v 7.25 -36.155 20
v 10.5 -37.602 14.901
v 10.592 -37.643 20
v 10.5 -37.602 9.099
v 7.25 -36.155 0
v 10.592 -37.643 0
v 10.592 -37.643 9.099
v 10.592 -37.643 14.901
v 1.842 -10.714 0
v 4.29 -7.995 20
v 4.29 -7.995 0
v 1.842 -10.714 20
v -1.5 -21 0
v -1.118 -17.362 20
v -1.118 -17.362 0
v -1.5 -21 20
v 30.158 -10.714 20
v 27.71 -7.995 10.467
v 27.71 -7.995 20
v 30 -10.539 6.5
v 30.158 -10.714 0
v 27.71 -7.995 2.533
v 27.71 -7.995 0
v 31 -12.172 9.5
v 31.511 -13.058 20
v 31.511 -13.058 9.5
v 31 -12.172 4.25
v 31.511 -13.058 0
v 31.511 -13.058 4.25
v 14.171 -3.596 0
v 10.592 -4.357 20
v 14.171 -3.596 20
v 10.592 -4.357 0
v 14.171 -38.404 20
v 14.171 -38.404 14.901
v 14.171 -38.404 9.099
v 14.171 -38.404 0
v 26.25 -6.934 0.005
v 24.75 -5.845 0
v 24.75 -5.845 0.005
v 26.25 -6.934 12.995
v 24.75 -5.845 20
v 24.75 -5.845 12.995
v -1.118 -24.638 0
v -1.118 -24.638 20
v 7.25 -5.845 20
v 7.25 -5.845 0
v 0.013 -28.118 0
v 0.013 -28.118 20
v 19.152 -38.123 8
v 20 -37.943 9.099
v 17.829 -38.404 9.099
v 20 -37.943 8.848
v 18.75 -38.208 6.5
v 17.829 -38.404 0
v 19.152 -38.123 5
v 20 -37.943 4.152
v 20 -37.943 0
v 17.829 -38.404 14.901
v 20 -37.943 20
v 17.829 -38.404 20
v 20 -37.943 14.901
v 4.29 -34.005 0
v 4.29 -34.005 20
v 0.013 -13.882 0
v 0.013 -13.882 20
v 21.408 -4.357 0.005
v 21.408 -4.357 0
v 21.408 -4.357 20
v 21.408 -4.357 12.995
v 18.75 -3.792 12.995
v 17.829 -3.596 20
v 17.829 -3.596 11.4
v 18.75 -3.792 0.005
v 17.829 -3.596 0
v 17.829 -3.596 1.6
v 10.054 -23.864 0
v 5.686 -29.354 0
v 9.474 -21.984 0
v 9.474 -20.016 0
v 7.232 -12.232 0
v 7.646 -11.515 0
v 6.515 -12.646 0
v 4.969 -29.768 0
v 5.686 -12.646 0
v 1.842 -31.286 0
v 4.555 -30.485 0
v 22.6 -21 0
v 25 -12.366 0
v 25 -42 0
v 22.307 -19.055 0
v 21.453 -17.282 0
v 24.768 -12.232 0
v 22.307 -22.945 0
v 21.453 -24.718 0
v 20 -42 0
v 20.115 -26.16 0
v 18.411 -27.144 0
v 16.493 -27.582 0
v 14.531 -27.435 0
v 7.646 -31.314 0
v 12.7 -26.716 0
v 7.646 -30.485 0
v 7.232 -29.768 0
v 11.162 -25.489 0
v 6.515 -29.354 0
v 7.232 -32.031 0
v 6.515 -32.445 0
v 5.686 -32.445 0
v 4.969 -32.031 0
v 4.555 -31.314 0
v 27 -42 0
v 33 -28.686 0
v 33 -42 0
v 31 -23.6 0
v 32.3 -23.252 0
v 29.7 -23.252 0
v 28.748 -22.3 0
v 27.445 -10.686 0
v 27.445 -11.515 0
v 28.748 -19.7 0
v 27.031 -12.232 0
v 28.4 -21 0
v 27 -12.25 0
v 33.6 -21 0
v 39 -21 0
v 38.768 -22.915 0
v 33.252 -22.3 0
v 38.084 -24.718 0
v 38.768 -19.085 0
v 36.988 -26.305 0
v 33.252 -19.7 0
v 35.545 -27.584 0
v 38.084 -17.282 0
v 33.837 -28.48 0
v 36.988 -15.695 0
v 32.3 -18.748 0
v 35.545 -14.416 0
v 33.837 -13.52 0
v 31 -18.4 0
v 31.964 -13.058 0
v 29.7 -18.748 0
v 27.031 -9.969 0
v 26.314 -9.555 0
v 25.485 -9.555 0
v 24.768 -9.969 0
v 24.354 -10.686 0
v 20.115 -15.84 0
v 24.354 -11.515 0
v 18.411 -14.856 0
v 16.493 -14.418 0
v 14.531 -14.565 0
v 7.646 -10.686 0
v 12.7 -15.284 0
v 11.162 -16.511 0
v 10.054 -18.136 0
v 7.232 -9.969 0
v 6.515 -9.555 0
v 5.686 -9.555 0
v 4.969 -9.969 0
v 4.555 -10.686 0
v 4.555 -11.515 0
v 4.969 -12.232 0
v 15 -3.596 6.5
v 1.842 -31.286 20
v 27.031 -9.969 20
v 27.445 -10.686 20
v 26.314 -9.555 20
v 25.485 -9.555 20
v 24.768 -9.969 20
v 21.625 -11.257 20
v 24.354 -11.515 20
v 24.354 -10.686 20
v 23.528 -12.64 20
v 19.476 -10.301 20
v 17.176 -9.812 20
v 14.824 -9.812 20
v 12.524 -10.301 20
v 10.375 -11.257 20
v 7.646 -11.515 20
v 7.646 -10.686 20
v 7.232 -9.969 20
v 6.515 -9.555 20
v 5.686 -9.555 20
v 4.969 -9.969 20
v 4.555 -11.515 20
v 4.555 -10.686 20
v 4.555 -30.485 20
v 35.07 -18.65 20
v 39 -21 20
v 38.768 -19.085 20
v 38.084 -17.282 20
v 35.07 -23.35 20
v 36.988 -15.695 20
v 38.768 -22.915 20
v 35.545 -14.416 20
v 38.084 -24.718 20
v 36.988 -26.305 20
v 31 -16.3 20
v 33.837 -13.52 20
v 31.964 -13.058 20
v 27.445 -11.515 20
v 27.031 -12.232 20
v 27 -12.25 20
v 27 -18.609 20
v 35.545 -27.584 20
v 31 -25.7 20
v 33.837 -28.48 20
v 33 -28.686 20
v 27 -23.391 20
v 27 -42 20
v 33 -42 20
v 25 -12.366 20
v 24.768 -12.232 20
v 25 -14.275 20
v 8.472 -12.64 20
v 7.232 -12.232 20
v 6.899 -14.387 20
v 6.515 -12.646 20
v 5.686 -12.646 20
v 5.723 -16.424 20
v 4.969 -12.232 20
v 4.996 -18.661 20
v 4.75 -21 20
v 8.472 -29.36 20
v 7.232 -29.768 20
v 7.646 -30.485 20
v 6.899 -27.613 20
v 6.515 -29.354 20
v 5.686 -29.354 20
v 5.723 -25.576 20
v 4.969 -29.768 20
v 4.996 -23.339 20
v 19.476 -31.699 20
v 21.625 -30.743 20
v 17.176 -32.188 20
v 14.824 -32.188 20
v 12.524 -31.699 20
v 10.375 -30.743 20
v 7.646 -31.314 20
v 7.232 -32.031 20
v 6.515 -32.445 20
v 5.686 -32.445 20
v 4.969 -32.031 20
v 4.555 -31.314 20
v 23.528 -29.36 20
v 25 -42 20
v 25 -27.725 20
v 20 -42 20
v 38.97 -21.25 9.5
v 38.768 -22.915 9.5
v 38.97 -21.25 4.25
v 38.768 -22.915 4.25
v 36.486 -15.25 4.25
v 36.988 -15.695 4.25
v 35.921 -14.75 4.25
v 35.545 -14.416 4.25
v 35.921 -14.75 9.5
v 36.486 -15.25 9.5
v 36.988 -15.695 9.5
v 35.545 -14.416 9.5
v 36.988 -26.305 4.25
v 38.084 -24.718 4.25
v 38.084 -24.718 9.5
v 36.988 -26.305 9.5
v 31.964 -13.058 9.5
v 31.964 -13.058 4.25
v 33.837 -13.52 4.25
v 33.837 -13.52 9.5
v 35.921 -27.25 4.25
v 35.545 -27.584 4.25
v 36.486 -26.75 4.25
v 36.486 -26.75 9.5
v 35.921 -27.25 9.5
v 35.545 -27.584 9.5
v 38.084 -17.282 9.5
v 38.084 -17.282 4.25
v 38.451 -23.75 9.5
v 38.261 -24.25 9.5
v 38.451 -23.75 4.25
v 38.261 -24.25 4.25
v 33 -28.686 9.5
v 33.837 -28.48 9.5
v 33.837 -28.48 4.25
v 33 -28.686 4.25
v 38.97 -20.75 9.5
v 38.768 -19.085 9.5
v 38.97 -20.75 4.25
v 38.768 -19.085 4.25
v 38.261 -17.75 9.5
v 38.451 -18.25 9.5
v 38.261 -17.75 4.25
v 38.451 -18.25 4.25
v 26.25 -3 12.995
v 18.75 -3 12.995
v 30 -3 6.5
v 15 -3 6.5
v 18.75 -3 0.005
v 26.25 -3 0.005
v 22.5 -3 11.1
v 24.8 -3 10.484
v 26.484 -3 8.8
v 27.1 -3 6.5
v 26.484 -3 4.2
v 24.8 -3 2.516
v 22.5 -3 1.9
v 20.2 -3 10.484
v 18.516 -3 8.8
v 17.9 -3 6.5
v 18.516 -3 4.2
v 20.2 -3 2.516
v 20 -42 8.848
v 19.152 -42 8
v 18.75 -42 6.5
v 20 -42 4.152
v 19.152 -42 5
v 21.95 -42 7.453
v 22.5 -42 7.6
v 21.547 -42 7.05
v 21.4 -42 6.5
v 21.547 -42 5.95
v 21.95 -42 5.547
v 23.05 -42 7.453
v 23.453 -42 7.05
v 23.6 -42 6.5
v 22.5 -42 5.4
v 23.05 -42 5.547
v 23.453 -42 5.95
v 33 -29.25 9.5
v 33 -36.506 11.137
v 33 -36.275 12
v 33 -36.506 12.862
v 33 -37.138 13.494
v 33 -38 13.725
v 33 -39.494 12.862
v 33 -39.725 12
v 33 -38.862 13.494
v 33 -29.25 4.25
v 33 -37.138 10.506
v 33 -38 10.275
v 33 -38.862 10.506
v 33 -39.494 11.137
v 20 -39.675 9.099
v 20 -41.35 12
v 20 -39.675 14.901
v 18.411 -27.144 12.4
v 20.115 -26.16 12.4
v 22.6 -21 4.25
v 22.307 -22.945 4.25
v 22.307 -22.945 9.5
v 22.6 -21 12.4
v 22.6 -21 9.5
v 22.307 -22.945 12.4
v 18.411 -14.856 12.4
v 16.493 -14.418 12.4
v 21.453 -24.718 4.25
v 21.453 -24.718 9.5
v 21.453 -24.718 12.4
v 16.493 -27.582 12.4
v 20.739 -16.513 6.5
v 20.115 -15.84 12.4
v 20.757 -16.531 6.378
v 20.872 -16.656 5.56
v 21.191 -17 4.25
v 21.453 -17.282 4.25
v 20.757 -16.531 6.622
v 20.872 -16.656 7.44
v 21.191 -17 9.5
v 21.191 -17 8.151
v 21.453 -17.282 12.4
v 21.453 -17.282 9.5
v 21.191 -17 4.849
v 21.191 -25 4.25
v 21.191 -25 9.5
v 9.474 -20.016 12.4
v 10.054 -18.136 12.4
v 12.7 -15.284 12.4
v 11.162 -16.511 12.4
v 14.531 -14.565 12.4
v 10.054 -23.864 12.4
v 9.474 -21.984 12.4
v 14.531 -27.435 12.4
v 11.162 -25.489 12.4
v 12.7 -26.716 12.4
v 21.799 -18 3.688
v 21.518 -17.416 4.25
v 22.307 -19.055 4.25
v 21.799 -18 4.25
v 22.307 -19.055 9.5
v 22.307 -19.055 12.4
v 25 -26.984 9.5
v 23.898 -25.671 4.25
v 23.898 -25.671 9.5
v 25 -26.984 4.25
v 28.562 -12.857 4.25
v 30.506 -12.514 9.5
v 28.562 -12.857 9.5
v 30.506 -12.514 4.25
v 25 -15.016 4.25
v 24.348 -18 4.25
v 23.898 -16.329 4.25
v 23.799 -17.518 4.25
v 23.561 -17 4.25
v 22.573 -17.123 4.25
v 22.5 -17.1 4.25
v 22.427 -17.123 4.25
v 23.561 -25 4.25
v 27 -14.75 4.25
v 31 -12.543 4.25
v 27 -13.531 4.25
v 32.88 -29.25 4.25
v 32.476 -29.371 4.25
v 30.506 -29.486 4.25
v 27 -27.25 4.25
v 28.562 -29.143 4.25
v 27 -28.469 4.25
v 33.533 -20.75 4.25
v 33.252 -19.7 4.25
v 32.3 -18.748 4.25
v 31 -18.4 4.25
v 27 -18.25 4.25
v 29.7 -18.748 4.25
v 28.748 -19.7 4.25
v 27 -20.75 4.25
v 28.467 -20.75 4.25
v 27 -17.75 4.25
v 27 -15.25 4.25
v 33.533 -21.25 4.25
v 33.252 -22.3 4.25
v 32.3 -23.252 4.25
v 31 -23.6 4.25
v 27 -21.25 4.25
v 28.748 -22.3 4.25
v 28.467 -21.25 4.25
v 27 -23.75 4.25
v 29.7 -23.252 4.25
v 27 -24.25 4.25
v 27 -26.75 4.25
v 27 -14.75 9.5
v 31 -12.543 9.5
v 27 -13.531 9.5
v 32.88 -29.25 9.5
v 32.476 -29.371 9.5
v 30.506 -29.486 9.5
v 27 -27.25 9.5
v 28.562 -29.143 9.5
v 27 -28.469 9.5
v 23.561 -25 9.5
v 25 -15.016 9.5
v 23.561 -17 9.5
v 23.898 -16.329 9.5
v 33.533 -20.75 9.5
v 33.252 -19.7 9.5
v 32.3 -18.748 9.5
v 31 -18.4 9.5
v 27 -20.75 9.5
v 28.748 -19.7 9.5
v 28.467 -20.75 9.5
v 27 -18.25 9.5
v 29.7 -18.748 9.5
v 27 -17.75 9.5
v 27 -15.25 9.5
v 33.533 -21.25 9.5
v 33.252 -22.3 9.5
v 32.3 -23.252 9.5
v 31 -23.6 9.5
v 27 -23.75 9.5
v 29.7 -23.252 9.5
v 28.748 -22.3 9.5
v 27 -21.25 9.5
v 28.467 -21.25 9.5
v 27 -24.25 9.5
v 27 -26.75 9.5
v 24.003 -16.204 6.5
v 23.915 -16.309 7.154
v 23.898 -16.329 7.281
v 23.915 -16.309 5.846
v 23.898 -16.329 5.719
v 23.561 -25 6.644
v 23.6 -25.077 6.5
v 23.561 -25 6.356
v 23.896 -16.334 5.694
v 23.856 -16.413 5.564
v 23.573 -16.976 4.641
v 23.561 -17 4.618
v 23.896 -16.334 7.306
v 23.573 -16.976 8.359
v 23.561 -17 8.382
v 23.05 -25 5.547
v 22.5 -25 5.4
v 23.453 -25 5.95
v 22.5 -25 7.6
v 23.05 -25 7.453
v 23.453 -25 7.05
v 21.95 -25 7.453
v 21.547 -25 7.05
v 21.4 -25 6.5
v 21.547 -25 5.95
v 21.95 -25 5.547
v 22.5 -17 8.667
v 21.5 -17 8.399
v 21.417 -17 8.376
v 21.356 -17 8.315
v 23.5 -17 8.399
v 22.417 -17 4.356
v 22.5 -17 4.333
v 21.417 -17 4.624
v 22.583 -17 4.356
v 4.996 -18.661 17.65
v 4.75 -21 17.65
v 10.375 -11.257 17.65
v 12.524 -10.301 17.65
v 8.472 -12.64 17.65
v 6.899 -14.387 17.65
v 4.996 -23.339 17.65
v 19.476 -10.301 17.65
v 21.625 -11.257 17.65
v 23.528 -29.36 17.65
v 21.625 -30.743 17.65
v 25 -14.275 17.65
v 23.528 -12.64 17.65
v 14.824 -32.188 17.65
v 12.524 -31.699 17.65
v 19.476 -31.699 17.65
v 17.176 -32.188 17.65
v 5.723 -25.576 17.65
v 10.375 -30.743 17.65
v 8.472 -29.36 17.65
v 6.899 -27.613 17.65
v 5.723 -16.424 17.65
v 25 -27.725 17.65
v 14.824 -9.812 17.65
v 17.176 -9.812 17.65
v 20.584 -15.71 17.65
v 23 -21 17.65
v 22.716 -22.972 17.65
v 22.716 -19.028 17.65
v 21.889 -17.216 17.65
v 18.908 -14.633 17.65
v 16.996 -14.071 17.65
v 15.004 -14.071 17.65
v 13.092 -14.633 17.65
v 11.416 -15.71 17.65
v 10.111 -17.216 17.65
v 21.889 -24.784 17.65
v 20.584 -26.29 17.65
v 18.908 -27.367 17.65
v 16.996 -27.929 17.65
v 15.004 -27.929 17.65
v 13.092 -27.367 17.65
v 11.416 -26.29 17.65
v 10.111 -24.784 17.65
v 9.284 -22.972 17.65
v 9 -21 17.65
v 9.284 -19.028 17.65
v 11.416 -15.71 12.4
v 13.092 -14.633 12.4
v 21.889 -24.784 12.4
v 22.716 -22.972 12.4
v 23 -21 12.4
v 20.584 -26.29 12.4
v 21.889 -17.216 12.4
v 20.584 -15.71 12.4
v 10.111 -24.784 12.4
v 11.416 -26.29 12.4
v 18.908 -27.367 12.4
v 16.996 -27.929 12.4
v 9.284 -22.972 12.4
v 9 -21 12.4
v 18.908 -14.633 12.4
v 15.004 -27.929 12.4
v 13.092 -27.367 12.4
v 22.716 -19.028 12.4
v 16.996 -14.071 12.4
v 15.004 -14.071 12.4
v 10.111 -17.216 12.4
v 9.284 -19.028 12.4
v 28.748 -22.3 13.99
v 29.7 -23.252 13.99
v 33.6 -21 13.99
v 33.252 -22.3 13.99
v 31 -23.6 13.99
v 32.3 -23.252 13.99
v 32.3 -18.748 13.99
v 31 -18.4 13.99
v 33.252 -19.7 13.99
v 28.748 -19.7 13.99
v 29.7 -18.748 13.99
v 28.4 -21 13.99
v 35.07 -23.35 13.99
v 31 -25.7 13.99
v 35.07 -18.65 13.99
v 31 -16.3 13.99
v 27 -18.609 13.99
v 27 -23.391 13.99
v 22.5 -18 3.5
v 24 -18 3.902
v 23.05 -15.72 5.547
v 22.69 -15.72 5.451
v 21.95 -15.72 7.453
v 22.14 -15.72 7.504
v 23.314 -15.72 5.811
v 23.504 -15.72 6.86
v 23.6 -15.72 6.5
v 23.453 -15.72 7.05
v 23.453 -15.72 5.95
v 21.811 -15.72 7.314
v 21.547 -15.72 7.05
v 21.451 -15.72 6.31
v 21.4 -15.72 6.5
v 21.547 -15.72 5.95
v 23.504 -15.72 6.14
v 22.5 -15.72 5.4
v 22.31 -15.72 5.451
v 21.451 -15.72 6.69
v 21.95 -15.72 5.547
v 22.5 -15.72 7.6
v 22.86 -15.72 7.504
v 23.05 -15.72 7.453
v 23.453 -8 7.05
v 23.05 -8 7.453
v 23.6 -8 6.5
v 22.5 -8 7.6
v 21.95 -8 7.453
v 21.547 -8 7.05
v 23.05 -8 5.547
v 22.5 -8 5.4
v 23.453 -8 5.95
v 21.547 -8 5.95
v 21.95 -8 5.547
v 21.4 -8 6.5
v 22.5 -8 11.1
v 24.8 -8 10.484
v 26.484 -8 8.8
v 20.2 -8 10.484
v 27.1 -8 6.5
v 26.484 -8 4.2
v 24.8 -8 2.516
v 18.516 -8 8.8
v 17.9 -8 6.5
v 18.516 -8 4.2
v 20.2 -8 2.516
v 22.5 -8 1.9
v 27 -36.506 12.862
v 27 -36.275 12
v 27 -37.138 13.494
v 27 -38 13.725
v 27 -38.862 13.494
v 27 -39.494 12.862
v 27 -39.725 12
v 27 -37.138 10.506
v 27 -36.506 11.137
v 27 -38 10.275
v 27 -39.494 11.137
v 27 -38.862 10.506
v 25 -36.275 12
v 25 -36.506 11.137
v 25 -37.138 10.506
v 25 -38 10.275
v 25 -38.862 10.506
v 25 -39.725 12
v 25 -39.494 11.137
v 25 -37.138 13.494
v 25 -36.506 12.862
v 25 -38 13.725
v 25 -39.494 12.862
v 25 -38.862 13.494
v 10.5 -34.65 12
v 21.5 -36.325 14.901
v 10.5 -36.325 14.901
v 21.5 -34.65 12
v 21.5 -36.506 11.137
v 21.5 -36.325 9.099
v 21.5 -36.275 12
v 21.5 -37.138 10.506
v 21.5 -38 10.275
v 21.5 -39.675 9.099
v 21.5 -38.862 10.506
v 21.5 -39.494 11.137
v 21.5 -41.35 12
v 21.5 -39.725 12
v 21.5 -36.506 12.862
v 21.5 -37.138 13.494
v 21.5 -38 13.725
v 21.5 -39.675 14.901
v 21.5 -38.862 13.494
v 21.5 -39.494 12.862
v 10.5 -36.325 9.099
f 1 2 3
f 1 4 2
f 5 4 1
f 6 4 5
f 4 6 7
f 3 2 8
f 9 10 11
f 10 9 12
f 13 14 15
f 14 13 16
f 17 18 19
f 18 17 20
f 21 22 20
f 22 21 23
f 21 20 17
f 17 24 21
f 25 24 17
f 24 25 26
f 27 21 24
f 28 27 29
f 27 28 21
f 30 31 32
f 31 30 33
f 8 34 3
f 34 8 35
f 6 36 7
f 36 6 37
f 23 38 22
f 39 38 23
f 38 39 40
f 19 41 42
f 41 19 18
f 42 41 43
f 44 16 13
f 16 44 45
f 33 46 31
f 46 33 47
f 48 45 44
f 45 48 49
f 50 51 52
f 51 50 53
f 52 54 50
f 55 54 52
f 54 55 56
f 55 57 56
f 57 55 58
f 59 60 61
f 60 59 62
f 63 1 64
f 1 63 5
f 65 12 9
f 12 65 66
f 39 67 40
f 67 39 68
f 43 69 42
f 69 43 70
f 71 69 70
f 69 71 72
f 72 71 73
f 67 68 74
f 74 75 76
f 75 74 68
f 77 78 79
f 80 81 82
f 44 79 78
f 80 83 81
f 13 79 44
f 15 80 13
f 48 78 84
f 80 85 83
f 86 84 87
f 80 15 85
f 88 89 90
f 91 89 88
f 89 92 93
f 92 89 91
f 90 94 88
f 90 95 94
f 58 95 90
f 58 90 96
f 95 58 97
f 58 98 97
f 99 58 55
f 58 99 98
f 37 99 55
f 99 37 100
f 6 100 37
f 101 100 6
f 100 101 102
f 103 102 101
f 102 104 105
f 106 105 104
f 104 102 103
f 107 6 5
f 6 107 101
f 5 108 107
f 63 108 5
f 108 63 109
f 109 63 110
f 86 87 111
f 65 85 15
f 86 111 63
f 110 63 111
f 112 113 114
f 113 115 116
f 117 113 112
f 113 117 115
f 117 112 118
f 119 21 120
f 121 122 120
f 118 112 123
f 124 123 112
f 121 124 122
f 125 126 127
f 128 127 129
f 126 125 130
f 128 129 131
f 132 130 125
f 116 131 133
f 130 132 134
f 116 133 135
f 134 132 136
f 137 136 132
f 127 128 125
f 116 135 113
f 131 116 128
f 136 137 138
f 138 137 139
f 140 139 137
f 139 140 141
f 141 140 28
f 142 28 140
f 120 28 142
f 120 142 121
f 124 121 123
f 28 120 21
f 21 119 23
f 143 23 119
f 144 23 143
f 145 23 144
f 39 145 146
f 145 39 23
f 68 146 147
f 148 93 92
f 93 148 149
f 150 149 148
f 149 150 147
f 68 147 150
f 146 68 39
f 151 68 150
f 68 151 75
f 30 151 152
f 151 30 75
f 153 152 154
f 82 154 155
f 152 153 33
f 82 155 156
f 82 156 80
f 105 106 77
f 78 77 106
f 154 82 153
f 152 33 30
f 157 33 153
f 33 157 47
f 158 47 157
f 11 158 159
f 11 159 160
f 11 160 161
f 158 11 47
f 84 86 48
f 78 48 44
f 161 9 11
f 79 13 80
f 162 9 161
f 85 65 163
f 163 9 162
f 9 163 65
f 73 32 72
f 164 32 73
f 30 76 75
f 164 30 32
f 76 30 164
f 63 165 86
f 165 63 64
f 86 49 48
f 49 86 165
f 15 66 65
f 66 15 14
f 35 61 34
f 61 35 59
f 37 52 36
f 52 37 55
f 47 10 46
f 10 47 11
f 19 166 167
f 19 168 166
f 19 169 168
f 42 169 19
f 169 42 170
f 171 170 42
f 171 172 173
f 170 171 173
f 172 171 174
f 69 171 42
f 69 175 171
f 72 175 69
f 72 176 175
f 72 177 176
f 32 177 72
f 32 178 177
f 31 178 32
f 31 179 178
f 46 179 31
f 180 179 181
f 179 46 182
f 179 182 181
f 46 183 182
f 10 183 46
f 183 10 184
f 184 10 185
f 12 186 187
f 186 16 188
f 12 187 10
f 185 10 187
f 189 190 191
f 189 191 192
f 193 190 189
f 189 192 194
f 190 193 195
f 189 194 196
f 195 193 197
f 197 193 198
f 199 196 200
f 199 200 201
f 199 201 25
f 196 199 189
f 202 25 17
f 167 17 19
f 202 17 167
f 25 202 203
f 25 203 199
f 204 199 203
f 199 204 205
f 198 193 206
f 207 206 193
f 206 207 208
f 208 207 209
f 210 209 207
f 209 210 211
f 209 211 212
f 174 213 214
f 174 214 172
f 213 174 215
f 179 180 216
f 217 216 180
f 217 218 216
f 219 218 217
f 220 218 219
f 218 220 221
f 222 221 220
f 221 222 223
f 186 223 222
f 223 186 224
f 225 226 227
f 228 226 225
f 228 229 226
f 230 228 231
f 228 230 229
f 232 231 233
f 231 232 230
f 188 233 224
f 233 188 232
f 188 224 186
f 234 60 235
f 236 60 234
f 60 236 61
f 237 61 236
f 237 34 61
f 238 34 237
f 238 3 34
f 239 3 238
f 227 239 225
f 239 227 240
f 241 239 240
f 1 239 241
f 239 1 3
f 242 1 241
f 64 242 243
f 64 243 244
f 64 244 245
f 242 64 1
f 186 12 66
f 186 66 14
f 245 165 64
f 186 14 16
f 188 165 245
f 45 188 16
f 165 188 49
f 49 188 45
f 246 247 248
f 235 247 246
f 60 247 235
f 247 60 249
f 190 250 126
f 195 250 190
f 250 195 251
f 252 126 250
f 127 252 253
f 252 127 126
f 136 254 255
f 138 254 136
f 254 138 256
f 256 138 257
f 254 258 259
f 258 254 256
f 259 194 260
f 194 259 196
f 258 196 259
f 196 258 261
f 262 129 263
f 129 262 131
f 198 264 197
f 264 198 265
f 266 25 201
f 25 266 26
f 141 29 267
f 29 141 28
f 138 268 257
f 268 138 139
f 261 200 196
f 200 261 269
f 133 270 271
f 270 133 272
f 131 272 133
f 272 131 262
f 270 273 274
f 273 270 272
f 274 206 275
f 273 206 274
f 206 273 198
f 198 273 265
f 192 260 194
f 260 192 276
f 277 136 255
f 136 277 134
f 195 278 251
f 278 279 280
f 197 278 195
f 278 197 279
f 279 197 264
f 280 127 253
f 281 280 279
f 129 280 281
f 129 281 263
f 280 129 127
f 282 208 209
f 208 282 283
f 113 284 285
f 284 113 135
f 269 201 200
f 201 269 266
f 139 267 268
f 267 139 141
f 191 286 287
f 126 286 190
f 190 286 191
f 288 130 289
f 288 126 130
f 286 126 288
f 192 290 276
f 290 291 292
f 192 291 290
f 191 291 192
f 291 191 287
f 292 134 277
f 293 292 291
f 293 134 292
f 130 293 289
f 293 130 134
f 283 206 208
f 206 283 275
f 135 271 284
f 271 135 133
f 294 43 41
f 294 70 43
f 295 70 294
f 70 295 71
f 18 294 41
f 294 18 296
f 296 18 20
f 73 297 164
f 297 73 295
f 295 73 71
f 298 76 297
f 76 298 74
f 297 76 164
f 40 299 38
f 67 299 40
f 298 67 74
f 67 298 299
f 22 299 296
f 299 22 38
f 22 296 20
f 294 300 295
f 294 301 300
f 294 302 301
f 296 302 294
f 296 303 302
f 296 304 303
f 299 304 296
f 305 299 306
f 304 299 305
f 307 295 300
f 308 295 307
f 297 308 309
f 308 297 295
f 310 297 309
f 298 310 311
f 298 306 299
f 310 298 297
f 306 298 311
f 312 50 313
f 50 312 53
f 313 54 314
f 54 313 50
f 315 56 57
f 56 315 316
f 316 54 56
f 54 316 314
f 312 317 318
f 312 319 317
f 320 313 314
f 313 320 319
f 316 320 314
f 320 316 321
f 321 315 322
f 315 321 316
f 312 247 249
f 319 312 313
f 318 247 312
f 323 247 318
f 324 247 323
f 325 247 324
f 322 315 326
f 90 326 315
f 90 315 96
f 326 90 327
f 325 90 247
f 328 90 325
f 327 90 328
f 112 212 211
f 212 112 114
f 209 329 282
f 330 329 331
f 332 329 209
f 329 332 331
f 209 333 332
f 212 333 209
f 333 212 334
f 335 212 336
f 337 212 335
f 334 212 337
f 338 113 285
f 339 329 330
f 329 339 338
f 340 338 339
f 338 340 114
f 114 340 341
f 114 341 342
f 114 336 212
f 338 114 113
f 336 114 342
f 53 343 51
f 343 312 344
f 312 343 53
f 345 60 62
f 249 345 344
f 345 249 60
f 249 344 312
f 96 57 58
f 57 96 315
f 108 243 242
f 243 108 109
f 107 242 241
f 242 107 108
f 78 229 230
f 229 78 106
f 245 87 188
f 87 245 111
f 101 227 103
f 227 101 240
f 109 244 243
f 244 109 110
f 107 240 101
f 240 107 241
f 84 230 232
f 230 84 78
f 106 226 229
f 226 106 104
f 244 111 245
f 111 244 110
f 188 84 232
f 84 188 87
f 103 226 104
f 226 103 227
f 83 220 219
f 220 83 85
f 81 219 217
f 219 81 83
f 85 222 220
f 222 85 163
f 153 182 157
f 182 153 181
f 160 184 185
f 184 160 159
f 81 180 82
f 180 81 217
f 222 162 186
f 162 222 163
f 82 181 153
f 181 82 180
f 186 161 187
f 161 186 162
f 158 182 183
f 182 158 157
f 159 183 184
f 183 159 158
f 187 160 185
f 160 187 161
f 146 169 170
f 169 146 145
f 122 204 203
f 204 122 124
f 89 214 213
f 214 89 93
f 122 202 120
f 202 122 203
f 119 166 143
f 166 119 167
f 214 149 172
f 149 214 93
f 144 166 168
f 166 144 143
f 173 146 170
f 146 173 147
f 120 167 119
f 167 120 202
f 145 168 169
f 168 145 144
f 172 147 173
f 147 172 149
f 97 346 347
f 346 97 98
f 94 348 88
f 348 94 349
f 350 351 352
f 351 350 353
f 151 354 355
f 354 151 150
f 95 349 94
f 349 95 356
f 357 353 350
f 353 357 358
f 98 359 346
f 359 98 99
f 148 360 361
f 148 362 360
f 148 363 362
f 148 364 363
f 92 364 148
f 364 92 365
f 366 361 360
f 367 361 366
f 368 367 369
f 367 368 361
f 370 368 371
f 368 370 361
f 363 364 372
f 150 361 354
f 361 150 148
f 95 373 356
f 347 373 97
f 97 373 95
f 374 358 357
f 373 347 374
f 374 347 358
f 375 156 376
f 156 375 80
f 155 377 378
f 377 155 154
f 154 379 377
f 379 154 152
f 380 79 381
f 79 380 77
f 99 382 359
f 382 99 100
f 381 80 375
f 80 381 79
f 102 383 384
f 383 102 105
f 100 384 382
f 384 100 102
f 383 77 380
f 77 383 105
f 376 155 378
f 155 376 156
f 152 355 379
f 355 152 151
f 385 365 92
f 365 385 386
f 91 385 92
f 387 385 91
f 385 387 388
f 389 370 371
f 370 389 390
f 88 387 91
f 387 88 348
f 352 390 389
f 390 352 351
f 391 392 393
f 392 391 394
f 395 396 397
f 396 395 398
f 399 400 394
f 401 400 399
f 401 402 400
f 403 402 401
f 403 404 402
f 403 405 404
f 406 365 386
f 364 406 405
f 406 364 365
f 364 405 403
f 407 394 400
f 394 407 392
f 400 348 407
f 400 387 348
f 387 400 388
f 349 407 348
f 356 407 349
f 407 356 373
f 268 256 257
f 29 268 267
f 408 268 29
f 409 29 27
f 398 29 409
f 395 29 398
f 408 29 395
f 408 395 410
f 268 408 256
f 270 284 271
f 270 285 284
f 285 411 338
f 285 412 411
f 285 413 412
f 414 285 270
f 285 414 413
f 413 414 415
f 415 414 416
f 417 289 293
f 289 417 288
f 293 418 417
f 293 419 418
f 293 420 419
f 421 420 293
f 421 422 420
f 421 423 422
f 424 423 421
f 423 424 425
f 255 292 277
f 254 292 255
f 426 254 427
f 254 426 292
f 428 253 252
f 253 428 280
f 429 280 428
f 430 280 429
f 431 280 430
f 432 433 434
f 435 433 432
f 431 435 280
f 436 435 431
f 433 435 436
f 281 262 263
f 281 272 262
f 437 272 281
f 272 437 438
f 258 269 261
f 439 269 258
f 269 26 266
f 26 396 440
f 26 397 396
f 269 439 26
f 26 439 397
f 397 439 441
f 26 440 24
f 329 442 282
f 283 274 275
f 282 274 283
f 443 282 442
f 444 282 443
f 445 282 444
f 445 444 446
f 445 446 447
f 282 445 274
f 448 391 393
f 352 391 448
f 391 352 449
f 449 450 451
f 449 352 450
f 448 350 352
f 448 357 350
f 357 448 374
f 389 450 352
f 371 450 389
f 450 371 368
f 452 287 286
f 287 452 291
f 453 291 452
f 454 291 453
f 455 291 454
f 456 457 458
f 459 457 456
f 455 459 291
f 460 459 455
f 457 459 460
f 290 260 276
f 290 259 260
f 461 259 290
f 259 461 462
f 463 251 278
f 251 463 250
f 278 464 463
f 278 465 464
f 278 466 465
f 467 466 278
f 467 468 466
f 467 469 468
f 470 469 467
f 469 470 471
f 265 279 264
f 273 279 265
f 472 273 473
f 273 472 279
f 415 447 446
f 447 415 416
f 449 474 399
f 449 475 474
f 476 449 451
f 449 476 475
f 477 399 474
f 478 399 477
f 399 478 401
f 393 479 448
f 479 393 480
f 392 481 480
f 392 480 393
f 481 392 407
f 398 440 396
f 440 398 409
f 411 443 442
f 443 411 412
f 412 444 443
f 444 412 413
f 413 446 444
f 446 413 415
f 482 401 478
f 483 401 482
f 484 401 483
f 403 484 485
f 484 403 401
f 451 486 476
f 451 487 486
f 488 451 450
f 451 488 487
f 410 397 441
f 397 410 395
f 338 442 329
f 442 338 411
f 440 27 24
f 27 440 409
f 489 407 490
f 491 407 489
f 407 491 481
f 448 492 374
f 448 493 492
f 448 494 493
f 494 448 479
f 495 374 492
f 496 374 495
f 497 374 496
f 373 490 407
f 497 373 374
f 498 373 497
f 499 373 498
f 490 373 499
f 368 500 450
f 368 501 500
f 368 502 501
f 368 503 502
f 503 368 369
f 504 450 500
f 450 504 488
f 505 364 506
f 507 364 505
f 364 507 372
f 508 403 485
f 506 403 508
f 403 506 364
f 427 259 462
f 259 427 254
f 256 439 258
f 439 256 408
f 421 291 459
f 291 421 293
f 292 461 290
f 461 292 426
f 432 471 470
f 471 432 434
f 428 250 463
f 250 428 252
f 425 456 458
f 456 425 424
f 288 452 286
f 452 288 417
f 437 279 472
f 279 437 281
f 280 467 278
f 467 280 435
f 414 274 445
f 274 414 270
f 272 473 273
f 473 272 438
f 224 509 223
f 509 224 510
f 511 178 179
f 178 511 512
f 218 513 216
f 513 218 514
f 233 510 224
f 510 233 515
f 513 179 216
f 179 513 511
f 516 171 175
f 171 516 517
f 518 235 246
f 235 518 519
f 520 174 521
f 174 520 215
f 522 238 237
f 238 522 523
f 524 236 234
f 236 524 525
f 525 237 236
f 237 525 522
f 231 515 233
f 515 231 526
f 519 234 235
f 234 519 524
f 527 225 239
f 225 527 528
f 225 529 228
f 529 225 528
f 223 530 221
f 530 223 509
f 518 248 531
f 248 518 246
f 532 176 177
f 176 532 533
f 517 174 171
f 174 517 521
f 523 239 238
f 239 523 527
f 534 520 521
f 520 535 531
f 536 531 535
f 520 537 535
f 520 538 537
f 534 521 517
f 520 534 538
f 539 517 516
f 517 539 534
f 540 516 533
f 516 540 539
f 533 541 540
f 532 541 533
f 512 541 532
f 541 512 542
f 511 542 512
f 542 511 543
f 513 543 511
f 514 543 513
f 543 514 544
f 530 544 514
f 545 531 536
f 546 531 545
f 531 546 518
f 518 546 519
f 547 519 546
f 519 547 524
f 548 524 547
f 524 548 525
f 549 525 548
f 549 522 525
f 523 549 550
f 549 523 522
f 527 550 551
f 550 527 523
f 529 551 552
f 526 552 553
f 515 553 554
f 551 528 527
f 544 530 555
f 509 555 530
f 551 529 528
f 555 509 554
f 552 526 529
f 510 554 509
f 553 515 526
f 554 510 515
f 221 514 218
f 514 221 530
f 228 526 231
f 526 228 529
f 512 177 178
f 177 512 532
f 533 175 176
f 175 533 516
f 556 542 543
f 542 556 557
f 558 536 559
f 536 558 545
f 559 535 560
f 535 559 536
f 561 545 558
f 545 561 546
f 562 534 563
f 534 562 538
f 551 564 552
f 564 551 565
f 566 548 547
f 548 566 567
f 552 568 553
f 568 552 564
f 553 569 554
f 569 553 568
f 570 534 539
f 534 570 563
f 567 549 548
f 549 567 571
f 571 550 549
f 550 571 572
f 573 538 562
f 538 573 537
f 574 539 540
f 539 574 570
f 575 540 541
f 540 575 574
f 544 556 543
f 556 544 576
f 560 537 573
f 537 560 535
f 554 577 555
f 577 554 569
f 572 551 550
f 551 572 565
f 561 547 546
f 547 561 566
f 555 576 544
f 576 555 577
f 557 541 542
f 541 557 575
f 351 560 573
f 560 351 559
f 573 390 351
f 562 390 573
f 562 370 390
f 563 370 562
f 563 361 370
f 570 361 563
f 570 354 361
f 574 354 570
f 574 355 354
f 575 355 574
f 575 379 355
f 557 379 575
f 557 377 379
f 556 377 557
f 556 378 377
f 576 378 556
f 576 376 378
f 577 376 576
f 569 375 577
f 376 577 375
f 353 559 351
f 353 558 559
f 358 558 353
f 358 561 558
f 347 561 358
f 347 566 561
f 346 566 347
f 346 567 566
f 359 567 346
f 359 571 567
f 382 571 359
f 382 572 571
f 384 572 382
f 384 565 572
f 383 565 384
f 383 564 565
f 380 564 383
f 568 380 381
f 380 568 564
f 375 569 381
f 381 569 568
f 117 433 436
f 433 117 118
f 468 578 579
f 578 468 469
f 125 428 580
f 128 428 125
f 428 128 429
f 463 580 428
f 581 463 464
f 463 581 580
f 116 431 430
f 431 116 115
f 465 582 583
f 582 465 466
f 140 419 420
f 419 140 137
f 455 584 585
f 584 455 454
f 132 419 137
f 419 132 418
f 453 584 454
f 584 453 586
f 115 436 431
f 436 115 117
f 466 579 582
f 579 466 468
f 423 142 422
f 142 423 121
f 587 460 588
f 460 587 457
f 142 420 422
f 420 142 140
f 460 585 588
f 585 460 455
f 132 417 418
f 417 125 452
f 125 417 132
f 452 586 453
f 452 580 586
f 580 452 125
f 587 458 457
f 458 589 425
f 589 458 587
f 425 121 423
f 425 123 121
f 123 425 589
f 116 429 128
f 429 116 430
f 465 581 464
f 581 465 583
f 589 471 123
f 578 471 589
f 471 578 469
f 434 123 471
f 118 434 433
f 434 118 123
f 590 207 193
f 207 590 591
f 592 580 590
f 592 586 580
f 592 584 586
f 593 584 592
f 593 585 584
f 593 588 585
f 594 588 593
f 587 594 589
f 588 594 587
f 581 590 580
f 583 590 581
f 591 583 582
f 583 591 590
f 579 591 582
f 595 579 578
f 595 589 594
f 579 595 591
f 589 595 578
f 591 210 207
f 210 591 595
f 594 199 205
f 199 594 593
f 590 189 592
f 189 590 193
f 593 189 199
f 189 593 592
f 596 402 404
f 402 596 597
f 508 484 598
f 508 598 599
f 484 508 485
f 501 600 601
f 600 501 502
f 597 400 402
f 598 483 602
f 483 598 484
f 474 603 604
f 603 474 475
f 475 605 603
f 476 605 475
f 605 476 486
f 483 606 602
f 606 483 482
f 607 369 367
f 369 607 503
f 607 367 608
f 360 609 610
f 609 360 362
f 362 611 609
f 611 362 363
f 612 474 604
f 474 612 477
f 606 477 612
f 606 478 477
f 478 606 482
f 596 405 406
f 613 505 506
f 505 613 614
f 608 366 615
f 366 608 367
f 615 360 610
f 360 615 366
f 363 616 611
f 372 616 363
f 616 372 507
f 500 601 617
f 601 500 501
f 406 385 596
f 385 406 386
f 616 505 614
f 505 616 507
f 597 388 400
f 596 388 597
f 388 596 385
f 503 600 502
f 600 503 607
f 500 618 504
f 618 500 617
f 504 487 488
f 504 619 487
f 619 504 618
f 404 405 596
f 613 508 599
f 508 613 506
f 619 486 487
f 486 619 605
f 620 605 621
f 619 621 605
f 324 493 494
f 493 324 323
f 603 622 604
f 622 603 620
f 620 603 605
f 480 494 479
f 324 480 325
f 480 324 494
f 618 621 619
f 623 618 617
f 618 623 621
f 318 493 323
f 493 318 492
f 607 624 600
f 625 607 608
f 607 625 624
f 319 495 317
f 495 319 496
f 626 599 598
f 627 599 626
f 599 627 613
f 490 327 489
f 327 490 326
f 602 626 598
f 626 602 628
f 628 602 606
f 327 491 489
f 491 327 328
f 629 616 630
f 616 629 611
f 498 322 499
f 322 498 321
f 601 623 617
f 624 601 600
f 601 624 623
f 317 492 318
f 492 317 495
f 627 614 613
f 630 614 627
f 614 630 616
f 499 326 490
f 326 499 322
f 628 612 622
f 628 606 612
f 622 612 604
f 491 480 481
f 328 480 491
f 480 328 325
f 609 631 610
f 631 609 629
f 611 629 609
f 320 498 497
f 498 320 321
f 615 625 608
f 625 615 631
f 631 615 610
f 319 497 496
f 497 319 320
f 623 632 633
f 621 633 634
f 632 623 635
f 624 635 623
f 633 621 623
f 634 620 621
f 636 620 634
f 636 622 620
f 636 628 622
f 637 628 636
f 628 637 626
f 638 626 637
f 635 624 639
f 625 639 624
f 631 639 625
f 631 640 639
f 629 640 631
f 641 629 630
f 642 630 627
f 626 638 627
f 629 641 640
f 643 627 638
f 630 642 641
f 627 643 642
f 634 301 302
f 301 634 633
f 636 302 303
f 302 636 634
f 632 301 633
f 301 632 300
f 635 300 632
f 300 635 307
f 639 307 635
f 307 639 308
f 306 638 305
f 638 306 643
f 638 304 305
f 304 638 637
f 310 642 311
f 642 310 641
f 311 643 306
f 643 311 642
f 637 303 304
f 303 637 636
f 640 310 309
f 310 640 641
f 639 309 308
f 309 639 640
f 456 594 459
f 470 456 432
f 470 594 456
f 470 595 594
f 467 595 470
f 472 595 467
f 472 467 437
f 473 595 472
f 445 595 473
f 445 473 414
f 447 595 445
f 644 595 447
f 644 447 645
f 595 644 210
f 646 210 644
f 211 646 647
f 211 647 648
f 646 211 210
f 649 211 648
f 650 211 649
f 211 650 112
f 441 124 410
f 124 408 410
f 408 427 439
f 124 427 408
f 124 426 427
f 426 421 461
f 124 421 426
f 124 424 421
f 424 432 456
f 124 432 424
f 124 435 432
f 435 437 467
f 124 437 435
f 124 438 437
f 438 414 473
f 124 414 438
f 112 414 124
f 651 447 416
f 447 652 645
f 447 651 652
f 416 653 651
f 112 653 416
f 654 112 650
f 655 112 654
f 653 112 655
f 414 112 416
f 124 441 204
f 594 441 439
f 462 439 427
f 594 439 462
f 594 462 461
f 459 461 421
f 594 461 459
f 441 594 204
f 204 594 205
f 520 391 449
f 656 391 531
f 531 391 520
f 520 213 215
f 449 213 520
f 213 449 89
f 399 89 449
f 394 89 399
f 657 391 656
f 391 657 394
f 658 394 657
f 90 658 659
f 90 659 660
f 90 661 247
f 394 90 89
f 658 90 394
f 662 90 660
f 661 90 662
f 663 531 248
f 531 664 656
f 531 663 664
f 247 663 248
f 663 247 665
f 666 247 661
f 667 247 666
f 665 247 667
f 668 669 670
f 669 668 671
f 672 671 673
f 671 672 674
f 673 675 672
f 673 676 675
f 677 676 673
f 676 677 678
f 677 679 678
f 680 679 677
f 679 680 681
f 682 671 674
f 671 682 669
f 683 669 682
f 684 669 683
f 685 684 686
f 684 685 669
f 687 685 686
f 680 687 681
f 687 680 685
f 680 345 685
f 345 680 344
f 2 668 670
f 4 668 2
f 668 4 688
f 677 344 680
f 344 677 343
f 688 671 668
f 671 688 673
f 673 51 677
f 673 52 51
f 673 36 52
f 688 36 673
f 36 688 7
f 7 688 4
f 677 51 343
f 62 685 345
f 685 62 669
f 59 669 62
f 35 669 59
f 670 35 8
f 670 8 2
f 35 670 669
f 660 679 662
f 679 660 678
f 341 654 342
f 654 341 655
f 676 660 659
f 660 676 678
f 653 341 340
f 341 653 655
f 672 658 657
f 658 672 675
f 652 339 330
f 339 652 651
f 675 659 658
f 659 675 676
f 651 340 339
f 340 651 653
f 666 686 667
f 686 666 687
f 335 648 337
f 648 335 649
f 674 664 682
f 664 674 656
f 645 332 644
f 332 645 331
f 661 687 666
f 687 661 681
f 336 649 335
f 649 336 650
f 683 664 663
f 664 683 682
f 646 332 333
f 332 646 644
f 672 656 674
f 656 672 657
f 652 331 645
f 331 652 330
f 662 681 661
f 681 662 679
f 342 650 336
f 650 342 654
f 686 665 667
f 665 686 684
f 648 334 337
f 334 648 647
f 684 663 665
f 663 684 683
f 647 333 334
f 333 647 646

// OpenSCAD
// file: configuration.scad
// Increase this if your slicer or printer make holes too tight.
extra_radius = 0.1;

// OD = outside diameter, corner to corner.
m3_nut_od = 6.1;
m3_nut_radius = m3_nut_od/2 + 0.2 + extra_radius;
m3_washer_radius = 3.5 + extra_radius;

// Major diameter of metric 3mm thread.
m3_major = 2.85;
m3_radius = m3_major/2 + extra_radius;
m3_wide_radius = m3_major/2 + extra_radius + 0.2;

// NEMA17 stepper motors.
motor_shaft_diameter = 5;
motor_shaft_radius = motor_shaft_diameter/2 + extra_radius;

// Frame brackets. M3x8mm screws work best with 3.6 mm brackets.
thickness = 3.6;

// OpenBeam or Misumi. Currently only 15x15 mm, but there is a plan
// to make models more parametric and allow 20x20 mm in the future.
extrusion = 20;

extrusion_channel_w = 5; //use 3 for 1515
extrusion_channel_d = 3; //use 3 for 1515
extrusion_fin_d = 1;

vertex_radius = 40.5; //set to 36 for 1515
vertex_x_offset = 7.25; // offset of the horizontal extrusion to the vertical one in X axis
vertex_y_offset = 39 ;//27; // offset of the horizontal extrusion to the vertical one in Y axis

// Placement for the NEMA17 stepper motors.
motor_offset = 44;
motor_length = 47;
// main file
// Based on "Makergear Filament drive goes Bowden" by Luke321
// http://www.thingiverse.com/thing:63674

include <configuration.scad>;

filament_offset = 22.5;

module extruder() {
  rotate([90, 0, 0]) difference() {
    union() {
      //main cylinder
      translate([16,20,21]) rotate([90,0,0]) cylinder(h=20, r=17.5);

      //bearing mount
      translate([31,20,21]) rotate([90,0,0]) cylinder (h=20, r=8);

      //pushfit/pneufit mount
      translate([filament_offset, 6.5, 13])
        cylinder(r=7.5, h=20, center=true, $fn=6);

      //filament support
      translate([21.75,6.5,34]) rotate([0,0,0]) cylinder (h=8, r=3, $fn=12);

      //clamp
      translate([20, 0, 28]) cube([13, 20, 14]);
    }

    //pulley opening
    translate([16,21,21]) rotate([90,0,0]){
      cylinder (h=22, r=6.6);

      rotate([0,0,45]) {
        //translate([14,0,0]) cylinder(h=22, r=1.6, $fn=12);
        translate([0,14,0]) cylinder(h=22, r=1.6, $fn=12);
        translate([-14,0,0]) cylinder(h=22, r=1.6, $fn=12);
        translate([0,-14,0]) cylinder(h=22, r=1.6, $fn=12);
      }
    }

    //gearhead indentation
    translate([16,21,21]) rotate([90,0,0]) cylinder (h=3.35, r=11.25);

    //pulley hub indentation
    translate([16,20-2,21]) rotate([90,0,0]) cylinder (h=5.6, r=7);

    //bearing screws
    translate([31,21,21]) rotate([90,0,0]) cylinder (h=22, r=2.6, $fn=12);
    #translate([31,22,21]) rotate([90,30,0]) cylinder (h=8.01, r=4.7, $fn=6);

    //bearing
    difference() {
      union() {
        translate([31,9.5,21]) rotate([90,0,0]) cylinder (h=5.25, r=8.5);
        translate([31,9.5-5.25,21-8.25-2]) cube([20, 5.25, 18.5]);
        //opening between bearing and pulley
        translate([20,9.5-5.25,21-8.25+3.25+1]) cube([10, 5.25, 8]);
      }
      //removable supports
      for (z = [15:3:27]) {
        translate([36, 10, z]) # cube([20, 20, 0.5], center=true);
      }
    }

    //filament path chamfer
    translate([filament_offset,6.5,15]) rotate([0,0,0]) #
      cylinder(h=3, r1=0.5, r2=3, $fn=12);

    //filament path
    translate([filament_offset,6.5,-10]) rotate([0,0,0]) #
      cylinder(h=60, r=1.1, $fn=12);

    //pushfit/pneufit mount default is 2.3.
    //for taobao small 6mm ,the  r = 2.7 
    //for taobao large 9mm , the r = 4.3
    translate([filament_offset, 6.5, 0]) # cylinder(r=4.6, h=8, $fn=12);

    //clamp slit
    translate([25,-1,10]) cube([2, 22, 35]);
    //clamp nut
    translate([10.5,12,38]) rotate([0,90,0])
      cylinder(h=11, r=m3_nut_radius, $fn=6);
    //clamp screw hole
    translate([15,12,38]) rotate([0,90,0])
      cylinder(h=20, r=m3_wide_radius, $fn=12);
  }
}

extruder();
